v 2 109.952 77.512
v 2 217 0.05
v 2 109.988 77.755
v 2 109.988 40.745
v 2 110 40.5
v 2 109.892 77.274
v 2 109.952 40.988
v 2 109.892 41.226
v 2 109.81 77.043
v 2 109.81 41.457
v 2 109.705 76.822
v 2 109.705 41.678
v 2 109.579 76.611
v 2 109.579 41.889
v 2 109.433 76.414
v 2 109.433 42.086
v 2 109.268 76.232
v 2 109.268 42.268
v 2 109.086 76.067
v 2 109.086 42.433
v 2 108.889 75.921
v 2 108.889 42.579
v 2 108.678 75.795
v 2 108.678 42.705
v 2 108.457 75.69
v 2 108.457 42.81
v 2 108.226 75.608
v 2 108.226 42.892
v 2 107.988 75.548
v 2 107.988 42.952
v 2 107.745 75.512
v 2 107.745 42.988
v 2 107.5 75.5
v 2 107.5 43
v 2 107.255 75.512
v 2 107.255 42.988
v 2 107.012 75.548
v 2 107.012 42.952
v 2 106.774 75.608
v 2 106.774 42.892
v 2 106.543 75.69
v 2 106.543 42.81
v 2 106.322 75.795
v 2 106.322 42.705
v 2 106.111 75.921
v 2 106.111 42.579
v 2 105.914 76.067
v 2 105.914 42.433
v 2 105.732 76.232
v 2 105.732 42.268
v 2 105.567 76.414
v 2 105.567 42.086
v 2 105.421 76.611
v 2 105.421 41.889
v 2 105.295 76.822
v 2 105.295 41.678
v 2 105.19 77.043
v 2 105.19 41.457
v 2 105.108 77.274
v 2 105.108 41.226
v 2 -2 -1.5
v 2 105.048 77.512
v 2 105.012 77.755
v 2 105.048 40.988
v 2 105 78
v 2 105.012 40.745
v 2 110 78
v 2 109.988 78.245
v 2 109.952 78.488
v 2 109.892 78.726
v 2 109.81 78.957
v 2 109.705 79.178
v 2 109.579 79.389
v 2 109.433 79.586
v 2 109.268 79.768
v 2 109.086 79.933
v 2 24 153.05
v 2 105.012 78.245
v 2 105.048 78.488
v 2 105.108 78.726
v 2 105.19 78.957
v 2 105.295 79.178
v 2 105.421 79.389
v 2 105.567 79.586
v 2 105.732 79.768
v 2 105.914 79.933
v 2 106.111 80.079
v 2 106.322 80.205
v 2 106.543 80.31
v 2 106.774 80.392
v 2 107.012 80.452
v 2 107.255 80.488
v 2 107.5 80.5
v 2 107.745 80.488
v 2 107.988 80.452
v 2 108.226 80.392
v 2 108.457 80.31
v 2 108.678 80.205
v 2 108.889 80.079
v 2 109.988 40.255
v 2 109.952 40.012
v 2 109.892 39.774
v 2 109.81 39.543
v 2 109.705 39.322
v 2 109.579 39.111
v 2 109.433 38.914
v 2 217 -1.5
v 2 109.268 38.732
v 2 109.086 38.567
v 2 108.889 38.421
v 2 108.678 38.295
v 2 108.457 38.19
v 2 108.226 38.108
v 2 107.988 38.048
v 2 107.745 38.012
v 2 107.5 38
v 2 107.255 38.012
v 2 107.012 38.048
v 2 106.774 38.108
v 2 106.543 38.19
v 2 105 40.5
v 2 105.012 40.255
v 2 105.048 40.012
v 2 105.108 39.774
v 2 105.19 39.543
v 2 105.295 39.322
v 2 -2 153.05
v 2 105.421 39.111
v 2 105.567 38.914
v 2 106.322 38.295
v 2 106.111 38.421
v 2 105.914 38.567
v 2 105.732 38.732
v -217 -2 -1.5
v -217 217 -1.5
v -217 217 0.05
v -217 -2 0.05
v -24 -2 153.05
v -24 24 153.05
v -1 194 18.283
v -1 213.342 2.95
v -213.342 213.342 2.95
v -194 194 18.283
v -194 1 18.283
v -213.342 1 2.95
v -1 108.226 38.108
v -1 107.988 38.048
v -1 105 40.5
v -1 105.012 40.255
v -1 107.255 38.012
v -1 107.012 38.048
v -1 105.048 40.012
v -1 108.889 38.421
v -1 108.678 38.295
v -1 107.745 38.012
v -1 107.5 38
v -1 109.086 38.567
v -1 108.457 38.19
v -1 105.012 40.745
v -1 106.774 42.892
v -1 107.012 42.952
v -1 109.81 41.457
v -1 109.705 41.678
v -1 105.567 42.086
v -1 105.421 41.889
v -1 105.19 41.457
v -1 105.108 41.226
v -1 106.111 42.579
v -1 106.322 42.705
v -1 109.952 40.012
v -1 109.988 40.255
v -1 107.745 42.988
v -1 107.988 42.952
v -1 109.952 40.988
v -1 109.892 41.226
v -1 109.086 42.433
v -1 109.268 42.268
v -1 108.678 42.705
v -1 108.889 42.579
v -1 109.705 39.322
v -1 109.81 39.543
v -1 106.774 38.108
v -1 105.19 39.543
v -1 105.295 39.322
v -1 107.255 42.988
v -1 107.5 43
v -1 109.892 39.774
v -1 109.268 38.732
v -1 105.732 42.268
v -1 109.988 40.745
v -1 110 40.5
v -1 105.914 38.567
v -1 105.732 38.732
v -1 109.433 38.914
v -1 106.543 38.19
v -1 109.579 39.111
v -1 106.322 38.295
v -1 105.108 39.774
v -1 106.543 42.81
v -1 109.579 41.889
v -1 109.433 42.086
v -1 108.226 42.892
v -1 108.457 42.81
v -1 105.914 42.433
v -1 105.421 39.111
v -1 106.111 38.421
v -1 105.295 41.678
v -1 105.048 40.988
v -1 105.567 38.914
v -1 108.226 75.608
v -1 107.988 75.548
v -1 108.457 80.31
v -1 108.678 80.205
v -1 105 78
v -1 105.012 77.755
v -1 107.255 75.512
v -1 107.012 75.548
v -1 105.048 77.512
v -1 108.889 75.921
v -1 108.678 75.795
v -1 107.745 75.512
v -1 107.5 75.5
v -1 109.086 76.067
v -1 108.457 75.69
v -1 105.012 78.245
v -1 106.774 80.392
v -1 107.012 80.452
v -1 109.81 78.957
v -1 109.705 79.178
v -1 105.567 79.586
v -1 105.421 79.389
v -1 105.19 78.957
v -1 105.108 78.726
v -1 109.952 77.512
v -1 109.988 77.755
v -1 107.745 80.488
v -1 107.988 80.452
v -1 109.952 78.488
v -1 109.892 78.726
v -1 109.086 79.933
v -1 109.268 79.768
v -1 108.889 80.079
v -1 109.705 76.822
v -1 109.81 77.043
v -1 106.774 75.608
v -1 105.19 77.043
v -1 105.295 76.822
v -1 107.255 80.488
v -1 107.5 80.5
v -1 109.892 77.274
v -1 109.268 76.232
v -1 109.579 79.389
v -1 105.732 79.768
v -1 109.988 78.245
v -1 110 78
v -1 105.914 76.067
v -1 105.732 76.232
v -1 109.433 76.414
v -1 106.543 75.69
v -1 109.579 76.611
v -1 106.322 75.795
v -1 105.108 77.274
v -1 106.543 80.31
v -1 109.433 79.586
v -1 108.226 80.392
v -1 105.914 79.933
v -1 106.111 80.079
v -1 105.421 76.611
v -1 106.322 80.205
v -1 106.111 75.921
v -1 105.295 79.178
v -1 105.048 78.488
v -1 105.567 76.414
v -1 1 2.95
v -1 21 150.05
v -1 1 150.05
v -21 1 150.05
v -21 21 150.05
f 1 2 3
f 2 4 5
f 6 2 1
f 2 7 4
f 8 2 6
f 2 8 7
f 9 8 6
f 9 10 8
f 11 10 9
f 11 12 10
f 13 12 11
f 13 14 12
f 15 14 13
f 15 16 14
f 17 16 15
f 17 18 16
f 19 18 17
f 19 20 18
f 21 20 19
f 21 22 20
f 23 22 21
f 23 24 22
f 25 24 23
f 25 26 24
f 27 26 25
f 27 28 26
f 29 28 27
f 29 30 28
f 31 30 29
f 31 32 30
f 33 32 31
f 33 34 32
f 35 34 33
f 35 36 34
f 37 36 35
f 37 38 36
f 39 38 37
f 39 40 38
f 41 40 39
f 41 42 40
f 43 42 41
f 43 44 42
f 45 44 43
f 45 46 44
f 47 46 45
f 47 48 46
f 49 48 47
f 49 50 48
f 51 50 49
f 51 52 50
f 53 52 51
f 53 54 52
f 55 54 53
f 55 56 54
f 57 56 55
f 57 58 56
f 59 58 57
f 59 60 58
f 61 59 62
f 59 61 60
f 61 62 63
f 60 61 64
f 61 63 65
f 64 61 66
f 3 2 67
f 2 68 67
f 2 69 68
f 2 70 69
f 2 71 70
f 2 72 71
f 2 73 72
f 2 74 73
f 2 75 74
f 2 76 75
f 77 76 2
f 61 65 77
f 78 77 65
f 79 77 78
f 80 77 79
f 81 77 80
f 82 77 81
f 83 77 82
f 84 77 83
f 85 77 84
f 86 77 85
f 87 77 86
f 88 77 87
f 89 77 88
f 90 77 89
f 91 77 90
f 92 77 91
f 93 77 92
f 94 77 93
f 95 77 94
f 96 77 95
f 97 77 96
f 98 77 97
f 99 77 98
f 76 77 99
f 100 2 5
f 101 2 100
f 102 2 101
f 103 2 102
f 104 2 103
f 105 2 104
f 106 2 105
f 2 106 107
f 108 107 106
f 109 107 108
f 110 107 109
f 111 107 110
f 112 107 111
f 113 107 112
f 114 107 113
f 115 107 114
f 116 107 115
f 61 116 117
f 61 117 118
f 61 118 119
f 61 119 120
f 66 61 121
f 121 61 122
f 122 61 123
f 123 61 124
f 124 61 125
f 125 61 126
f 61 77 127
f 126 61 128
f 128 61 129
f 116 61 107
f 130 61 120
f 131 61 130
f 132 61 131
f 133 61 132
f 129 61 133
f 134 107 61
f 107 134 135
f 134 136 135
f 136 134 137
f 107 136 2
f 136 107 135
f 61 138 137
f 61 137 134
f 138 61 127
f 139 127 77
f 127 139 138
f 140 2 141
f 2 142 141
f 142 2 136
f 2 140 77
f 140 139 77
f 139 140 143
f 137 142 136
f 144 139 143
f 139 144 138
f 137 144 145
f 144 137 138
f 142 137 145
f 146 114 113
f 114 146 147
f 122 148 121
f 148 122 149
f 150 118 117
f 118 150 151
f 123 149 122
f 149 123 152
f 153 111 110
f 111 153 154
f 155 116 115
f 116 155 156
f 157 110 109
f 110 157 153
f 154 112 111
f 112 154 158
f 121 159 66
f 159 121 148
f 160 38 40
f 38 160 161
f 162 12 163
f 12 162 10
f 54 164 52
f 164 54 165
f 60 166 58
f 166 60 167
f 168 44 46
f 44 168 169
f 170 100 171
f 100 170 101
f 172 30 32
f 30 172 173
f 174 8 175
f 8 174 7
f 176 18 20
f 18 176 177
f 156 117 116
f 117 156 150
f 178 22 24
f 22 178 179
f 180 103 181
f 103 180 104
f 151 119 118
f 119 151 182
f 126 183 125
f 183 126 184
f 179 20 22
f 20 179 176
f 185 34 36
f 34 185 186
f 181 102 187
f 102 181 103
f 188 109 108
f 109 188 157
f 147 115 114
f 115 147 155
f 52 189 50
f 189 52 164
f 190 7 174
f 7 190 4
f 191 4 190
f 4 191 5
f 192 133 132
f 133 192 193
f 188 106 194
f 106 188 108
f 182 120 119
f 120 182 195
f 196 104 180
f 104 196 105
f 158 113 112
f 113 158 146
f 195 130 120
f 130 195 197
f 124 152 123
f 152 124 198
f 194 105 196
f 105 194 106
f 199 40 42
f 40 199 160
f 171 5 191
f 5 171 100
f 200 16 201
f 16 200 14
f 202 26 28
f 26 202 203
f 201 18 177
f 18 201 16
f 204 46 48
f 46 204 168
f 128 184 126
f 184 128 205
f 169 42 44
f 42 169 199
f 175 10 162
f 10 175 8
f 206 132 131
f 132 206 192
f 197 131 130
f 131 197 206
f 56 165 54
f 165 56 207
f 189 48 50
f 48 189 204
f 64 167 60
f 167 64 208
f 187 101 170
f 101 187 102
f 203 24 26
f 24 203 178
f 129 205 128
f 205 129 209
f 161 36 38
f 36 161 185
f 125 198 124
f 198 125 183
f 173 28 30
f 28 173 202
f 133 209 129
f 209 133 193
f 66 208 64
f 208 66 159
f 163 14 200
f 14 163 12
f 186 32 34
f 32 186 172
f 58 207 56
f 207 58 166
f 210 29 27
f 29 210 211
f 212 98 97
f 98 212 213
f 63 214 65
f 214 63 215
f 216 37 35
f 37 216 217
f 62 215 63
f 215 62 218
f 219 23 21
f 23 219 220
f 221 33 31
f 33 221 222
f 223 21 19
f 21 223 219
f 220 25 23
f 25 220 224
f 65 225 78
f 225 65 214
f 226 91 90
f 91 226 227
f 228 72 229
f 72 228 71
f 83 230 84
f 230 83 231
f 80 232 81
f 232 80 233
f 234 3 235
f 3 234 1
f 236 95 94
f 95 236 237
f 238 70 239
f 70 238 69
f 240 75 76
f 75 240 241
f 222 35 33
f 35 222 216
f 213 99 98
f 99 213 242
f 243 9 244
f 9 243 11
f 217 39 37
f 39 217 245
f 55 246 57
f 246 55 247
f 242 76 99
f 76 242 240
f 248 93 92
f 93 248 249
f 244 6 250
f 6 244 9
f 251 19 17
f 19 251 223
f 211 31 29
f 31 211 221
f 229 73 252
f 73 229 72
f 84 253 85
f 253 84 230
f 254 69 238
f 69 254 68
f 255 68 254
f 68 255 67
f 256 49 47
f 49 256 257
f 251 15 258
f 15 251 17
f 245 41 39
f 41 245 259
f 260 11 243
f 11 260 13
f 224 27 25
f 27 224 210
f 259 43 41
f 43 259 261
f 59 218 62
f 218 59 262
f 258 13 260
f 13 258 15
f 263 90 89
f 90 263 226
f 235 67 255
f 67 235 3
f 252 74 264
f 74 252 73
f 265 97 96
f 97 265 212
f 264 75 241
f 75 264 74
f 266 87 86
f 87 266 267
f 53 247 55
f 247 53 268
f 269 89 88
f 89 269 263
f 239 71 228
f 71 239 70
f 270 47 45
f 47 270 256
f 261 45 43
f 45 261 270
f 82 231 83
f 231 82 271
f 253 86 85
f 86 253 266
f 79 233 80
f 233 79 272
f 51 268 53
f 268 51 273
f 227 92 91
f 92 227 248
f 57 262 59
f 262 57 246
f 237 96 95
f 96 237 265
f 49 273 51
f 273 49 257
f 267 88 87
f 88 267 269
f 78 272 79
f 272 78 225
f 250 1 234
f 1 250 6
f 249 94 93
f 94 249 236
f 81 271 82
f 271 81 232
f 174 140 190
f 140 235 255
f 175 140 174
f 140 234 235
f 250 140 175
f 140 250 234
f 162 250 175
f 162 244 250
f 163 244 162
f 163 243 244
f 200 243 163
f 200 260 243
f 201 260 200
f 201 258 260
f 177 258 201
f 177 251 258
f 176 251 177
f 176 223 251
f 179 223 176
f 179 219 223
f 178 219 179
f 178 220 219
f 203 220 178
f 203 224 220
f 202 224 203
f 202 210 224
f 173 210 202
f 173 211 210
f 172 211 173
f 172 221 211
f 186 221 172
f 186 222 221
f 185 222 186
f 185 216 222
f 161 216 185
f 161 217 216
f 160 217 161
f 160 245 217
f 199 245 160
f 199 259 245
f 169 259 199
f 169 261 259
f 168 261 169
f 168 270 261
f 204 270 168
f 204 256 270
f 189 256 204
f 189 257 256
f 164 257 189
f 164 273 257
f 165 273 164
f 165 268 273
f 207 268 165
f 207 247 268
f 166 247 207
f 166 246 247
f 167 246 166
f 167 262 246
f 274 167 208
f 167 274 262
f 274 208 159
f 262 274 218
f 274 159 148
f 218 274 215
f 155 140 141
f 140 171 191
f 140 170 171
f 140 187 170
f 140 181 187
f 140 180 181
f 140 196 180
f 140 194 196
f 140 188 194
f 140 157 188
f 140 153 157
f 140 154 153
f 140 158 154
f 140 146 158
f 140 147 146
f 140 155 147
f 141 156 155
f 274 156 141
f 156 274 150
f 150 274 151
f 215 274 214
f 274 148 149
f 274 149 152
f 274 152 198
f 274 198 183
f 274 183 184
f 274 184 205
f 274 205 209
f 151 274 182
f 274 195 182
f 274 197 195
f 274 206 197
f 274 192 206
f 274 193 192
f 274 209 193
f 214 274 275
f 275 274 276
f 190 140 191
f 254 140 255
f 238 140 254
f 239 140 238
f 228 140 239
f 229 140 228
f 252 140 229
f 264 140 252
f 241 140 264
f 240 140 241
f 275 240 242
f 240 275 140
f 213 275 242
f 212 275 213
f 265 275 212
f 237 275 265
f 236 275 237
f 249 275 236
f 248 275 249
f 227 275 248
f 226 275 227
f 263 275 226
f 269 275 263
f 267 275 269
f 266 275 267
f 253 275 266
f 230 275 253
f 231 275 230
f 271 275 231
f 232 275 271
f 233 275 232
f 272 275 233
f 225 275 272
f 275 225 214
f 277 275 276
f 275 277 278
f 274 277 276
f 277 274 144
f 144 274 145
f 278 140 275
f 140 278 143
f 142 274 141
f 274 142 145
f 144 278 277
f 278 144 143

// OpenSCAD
$fn = 64;
difference() {
	union() {
		difference() {
			translate(v = [-107.5, 107.5, 0]) {
				cube(center = true, size = [219.0, 219.0, 3]);
			}
			translate(v = [-107.5, 107.5, 1.5]) {
				cube(center = true, size = [219.0, 219.0, 3.1]);
			}
		}
		hull() {
			translate(v = [-107.5, 107.5, 0]) {
				cube(center = true, size = [219.0, 219.0, 0.1]);
			}
			translate(v = [-11.0, 11.0, 153]) {
				cube(center = true, size = [26.0, 26.0, 0.1]);
			}
		}
	}
	hull() {
		translate(v = [-107.5, 107.5, 3]) {
			cube(center = true, size = [213.0, 213.0, 0.1]);
		}
		translate(v = [-11.0, 11.0, 150]) {
			cube(center = true, size = [20.0, 20.0, 0.1]);
		}
	}
	union() {
		translate(v = [0, 107.5, 40.5]) {
			rotate(a = [0, 90, 0]) {
				cylinder(center = true, h = 30, r = 2.5);
			}
		}
		translate(v = [0, 107.5, 78.0]) {
			rotate(a = [0, 90, 0]) {
				cylinder(center = true, h = 30, r = 2.5);
			}
		}
		translate(v = [0, 107.5, 115.5]) {
			rotate(a = [0, 90, 0]) {
				cylinder(center = true, h = 30, r = 2.5);
			}
		}
	}
}
